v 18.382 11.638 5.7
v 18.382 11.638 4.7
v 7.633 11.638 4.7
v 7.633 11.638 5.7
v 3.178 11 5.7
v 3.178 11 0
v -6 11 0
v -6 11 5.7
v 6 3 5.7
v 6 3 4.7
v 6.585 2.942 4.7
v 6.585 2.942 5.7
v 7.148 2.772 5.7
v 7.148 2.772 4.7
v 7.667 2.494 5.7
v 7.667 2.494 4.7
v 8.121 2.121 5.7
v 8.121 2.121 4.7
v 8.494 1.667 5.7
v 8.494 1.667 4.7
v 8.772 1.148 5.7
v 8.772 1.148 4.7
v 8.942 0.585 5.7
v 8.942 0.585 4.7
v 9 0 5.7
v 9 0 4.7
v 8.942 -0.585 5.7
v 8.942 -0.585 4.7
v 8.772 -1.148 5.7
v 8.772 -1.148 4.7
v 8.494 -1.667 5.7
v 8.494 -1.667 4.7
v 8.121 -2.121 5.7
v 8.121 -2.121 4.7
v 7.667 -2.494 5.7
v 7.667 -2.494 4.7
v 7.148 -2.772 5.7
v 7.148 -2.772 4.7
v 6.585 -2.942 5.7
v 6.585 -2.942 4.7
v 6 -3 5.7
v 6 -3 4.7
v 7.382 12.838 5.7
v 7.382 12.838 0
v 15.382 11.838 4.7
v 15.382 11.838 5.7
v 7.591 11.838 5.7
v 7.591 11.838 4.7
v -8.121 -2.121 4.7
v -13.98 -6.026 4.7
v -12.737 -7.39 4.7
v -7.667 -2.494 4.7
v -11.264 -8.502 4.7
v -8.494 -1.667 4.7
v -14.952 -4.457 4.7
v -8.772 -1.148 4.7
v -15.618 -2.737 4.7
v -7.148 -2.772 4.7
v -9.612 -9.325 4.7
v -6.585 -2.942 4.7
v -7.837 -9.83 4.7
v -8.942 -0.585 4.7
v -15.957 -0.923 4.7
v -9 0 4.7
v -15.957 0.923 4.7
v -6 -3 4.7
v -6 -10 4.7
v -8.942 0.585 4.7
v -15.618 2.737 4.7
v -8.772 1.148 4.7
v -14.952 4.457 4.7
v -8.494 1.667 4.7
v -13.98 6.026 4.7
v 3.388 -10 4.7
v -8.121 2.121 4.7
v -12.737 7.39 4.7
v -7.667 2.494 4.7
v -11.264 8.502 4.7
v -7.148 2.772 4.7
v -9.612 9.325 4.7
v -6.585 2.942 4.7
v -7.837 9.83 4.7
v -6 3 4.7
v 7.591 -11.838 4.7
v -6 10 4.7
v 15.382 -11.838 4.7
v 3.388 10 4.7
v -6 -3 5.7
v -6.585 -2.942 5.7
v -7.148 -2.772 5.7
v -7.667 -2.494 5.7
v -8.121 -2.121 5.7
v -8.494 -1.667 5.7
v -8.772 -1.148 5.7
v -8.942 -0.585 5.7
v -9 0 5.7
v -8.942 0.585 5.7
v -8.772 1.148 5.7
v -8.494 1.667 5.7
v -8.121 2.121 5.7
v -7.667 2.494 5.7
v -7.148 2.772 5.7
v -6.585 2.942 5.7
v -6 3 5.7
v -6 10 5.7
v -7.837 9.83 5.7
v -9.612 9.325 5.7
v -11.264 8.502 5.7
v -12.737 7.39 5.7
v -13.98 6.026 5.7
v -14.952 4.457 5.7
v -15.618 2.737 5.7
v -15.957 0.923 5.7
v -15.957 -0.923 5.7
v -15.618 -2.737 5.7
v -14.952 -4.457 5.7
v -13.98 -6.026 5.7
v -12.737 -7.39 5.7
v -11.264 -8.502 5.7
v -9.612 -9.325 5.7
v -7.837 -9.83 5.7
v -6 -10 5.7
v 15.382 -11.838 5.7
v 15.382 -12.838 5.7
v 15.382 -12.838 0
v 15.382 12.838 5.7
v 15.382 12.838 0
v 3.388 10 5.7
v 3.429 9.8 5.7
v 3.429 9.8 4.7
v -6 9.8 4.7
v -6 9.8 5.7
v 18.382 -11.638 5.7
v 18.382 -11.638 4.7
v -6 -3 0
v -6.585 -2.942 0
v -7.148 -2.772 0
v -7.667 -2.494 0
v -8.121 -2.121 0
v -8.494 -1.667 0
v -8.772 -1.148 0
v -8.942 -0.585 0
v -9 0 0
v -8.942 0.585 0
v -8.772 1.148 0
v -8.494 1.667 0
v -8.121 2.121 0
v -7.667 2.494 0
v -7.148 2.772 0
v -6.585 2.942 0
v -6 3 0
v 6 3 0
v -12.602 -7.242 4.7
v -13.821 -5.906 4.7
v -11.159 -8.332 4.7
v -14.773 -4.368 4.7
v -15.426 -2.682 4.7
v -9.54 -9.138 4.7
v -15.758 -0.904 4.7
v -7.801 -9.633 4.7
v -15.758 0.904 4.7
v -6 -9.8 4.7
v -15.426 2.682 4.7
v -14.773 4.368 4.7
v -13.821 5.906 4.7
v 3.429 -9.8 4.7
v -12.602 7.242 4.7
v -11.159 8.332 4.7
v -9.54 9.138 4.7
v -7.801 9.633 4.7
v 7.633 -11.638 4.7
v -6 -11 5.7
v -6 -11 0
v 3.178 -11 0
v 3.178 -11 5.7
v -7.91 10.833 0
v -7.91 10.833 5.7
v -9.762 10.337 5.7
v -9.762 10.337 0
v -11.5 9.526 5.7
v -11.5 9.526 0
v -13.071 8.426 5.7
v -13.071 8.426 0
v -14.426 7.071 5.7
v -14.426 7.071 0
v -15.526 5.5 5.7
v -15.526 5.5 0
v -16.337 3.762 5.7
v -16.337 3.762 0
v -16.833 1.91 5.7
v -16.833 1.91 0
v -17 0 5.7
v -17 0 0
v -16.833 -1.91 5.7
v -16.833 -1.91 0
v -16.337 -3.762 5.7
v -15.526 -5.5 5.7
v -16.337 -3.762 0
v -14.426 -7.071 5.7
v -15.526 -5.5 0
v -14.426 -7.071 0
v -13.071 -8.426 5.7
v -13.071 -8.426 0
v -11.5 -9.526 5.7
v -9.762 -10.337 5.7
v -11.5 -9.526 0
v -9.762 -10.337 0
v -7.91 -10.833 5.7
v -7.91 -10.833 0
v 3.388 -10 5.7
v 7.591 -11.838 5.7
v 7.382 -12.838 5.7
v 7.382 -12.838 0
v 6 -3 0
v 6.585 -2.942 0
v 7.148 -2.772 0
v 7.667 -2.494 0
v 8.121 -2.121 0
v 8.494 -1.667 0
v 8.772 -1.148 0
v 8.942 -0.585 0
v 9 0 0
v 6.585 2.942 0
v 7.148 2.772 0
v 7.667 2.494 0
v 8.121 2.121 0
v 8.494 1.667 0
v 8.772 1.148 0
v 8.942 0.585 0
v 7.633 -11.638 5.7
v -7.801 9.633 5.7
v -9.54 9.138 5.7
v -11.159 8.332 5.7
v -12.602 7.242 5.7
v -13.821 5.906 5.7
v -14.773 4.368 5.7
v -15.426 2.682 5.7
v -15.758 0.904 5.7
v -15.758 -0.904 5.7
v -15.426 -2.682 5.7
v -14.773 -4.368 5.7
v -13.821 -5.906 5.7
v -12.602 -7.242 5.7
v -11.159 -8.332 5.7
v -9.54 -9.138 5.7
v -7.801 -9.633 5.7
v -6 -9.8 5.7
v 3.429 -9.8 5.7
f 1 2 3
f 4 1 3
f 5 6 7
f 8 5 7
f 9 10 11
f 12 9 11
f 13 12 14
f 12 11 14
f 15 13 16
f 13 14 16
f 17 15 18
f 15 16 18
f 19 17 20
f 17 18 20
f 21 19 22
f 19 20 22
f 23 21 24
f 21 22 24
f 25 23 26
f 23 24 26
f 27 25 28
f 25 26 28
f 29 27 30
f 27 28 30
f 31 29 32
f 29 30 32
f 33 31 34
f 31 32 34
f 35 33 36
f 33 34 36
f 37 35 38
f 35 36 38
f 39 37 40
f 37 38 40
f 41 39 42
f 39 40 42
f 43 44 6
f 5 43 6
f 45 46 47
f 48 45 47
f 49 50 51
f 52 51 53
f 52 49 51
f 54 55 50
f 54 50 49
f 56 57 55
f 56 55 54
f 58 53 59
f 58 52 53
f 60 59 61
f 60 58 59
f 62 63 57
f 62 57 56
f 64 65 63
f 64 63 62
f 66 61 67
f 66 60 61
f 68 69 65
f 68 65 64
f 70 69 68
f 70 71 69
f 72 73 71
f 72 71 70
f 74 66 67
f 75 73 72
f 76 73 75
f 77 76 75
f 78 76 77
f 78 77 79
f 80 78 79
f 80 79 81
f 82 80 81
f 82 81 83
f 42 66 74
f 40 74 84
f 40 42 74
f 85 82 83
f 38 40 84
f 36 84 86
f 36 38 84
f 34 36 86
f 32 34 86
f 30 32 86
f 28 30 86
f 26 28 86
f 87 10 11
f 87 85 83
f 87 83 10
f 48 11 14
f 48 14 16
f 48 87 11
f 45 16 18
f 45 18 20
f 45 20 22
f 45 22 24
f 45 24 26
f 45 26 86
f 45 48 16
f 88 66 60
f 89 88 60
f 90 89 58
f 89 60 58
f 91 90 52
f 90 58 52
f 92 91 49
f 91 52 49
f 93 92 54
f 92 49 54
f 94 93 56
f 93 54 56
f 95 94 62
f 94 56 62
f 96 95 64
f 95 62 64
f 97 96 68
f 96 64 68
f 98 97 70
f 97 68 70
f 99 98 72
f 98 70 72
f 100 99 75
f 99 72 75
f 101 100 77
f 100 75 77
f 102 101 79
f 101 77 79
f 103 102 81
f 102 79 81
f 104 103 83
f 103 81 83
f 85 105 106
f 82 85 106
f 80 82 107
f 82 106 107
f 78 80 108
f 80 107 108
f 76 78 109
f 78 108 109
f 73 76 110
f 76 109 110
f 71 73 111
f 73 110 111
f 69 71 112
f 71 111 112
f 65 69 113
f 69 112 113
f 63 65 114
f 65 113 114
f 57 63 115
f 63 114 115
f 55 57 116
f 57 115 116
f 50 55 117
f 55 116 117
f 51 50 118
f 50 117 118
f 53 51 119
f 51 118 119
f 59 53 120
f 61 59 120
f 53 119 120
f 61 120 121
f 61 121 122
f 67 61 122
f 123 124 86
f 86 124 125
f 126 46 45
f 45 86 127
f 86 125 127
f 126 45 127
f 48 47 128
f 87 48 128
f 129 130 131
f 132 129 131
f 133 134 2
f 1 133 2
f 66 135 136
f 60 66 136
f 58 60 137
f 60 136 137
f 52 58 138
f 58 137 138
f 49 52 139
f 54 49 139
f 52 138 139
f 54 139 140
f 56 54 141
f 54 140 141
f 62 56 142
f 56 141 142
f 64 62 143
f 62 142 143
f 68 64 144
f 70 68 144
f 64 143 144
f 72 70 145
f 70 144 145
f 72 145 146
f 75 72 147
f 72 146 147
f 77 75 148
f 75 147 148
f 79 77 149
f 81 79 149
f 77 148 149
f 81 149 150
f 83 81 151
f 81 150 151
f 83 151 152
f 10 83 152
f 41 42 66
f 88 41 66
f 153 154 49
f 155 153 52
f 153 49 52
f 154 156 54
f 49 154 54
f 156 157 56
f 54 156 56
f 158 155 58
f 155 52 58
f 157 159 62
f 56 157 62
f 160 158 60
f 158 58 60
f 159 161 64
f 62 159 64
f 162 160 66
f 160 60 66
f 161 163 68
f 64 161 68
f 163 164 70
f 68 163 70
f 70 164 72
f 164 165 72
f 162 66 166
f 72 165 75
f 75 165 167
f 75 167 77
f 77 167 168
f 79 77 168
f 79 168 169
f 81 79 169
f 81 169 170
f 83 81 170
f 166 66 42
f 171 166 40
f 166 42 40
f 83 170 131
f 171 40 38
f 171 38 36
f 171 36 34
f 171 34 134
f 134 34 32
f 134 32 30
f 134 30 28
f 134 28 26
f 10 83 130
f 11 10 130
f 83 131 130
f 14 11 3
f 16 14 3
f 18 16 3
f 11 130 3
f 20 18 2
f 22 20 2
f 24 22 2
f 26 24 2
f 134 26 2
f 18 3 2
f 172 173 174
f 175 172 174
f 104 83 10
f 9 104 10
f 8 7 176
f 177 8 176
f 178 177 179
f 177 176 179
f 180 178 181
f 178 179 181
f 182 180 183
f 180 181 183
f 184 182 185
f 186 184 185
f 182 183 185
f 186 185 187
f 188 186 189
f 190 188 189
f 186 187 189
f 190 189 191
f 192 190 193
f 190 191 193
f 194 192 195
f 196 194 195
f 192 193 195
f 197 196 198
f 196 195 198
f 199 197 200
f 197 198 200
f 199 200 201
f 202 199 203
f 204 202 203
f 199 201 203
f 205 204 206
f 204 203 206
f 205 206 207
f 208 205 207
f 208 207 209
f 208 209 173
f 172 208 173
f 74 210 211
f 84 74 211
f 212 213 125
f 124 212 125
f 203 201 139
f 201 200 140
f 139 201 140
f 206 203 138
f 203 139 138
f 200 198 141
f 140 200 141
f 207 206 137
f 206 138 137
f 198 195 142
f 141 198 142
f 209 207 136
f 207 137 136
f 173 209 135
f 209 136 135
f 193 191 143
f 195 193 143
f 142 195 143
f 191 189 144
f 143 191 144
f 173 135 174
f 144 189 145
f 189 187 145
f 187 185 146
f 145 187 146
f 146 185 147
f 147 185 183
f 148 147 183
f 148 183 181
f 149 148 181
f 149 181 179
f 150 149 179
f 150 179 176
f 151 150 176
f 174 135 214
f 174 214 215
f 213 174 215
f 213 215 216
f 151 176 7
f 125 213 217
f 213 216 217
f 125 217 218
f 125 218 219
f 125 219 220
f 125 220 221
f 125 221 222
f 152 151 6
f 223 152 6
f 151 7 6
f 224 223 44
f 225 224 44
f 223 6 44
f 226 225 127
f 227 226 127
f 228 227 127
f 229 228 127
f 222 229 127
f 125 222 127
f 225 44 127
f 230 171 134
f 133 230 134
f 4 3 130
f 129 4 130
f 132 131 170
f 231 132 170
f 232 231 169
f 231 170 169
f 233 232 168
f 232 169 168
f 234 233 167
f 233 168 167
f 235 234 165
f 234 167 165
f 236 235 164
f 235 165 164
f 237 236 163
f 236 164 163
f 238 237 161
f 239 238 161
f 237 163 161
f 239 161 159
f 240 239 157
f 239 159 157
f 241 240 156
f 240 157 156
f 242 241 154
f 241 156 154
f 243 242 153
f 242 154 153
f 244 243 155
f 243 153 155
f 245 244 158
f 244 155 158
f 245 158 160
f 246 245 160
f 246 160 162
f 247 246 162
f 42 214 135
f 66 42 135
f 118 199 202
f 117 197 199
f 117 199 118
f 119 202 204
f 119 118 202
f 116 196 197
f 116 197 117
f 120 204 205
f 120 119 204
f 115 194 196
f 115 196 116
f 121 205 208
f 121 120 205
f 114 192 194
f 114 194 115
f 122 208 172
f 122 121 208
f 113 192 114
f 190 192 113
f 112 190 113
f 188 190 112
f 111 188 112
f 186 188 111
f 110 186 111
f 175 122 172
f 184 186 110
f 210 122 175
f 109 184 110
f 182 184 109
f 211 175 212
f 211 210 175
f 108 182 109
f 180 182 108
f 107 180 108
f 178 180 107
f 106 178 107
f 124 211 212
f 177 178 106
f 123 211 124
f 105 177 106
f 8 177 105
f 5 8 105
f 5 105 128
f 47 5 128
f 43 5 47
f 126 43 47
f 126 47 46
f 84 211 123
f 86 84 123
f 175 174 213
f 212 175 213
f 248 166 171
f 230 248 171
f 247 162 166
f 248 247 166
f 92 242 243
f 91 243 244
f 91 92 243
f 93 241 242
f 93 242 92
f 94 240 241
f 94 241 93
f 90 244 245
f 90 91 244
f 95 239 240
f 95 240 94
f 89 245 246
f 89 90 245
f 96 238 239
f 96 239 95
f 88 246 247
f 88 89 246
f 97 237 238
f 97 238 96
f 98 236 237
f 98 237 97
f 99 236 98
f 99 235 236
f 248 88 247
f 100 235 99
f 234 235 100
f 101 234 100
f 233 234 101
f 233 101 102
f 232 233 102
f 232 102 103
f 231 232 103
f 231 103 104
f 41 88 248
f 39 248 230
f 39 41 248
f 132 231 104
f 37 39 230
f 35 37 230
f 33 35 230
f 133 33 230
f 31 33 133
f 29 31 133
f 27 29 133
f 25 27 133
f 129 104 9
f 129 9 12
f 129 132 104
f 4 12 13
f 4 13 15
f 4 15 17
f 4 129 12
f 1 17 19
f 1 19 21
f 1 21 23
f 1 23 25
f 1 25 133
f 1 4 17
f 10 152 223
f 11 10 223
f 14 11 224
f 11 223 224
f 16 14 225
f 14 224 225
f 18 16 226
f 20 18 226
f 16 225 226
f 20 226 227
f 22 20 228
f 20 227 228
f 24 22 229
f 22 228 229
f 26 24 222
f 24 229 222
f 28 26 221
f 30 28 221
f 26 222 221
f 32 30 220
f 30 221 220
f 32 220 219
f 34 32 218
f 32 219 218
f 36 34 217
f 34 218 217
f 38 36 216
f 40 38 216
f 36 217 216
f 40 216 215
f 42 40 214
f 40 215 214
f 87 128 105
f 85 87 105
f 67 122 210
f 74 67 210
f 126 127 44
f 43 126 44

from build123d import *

# Parameters (mm, degrees)
F1_DEPTH = 5.7
F3_DEPTH = 1
F4_W     = 3
F4_H     = 23.2766547906
F5_DEPTH = 1


with BuildPart() as f1:
    # F0 (on Top) → F1 (new body)
    with BuildSketch(Plane.XY):
        with BuildLine():
            Line((3.1784902789, 11), (-6, 11))
            ThreePointArc((-6, 11), (-17, 0), (-6, -11))
            Line((-6, -11), (3.1784902789, -11))
            Line((3.1784902789, -11), (7.3816459231, -12.8383273953))
            Line((7.3816459231, -12.8383273953), (15.3816459231, -12.8383273953))
            Line((15.3816459231, -12.8383273953), (15.3816459231, 12.8383273953))
            Line((15.3816459231, 12.8383273953), (7.3816459231, 12.8383273953))
            Line((7.3816459231, 12.8383273953), (3.1784902789, 11))
        make_face()
        with BuildLine():
            ThreePointArc((-6, -3), (-9, 0), (-6, 3))
            Line((-6, 3), (6, 3))
            ThreePointArc((6, 3), (9, 0), (6, -3))
            Line((6, -3), (-6, -3))
        make_face(mode=Mode.SUBTRACT)
    extrude(amount=F1_DEPTH)

    # F2 (on face) → F3 (cut)
    with BuildSketch(Plane.XY.offset(5.7)):
        with BuildLine():
            Line((-6, -10), (3.3876110814, -10))
            Line((3.3876110814, -10), (7.5907667256, -11.8383273953))
            Line((7.5907667256, -11.8383273953), (11.9922485031, -11.8383273953))
            Line((11.9922485031, -11.8383273953), (15.3816459231, -11.8383273953))
            Line((15.3816459231, -11.8383273953), (15.3816459231, 11.8383273953))
            Line((15.3816459231, 11.8383273953), (11.9922485031, 11.8383273953))
            Line((11.9922485031, 11.8383273953), (7.5907667256, 11.8383273953))
            Line((7.5907667256, 11.8383273953), (3.3876110814, 10))
            Line((3.3876110814, 10), (-6, 10))
            ThreePointArc((-6, 10), (-16, 0), (-6, -10))
        make_face()
        with BuildLine():
            Line((6, -3), (-6, -3))
            ThreePointArc((-6, -3), (-9, 0), (-6, 3))
            Line((-6, 3), (6, 3))
            ThreePointArc((6, 3), (9, 0), (6, -3))
        make_face(mode=Mode.SUBTRACT)
    extrude(amount=-F3_DEPTH, mode=Mode.SUBTRACT)


with BuildPart() as f5:
    # F4 (on face) → F5 (new body)
    with BuildSketch(Plane.XY.offset(4.7)):
        with Locations((16.8816459231, 0)):
            Rectangle(F4_W, F4_H)
        with BuildLine():
            Line((7.6325908861, -11.6383273953), (15.3816459231, -11.6383273953))
            Line((15.3816459231, -11.6383273953), (15.3816459231, 11.6383273953))
            Line((15.3816459231, 11.6383273953), (7.6325908861, 11.6383273953))
            Line((7.6325908861, 11.6383273953), (3.4294352419, 9.8))
            Line((3.4294352419, 9.8), (-6, 9.8))
            ThreePointArc((-6, 9.8), (-15.8, 0), (-6, -9.8))
            Line((-6, -9.8), (3.4294352419, -9.8))
            Line((3.4294352419, -9.8), (7.6325908861, -11.6383273953))
        make_face()
        with BuildLine():
            ThreePointArc((6, 3), (9, 0), (6, -3))
            Line((6, -3), (-6, -3))
            ThreePointArc((-6, -3), (-9, 0), (-6, 3))
            Line((-6, 3), (6, 3))
        make_face(mode=Mode.SUBTRACT)
    extrude(amount=F5_DEPTH)


solid = Compound([f1.part, f5.part])
